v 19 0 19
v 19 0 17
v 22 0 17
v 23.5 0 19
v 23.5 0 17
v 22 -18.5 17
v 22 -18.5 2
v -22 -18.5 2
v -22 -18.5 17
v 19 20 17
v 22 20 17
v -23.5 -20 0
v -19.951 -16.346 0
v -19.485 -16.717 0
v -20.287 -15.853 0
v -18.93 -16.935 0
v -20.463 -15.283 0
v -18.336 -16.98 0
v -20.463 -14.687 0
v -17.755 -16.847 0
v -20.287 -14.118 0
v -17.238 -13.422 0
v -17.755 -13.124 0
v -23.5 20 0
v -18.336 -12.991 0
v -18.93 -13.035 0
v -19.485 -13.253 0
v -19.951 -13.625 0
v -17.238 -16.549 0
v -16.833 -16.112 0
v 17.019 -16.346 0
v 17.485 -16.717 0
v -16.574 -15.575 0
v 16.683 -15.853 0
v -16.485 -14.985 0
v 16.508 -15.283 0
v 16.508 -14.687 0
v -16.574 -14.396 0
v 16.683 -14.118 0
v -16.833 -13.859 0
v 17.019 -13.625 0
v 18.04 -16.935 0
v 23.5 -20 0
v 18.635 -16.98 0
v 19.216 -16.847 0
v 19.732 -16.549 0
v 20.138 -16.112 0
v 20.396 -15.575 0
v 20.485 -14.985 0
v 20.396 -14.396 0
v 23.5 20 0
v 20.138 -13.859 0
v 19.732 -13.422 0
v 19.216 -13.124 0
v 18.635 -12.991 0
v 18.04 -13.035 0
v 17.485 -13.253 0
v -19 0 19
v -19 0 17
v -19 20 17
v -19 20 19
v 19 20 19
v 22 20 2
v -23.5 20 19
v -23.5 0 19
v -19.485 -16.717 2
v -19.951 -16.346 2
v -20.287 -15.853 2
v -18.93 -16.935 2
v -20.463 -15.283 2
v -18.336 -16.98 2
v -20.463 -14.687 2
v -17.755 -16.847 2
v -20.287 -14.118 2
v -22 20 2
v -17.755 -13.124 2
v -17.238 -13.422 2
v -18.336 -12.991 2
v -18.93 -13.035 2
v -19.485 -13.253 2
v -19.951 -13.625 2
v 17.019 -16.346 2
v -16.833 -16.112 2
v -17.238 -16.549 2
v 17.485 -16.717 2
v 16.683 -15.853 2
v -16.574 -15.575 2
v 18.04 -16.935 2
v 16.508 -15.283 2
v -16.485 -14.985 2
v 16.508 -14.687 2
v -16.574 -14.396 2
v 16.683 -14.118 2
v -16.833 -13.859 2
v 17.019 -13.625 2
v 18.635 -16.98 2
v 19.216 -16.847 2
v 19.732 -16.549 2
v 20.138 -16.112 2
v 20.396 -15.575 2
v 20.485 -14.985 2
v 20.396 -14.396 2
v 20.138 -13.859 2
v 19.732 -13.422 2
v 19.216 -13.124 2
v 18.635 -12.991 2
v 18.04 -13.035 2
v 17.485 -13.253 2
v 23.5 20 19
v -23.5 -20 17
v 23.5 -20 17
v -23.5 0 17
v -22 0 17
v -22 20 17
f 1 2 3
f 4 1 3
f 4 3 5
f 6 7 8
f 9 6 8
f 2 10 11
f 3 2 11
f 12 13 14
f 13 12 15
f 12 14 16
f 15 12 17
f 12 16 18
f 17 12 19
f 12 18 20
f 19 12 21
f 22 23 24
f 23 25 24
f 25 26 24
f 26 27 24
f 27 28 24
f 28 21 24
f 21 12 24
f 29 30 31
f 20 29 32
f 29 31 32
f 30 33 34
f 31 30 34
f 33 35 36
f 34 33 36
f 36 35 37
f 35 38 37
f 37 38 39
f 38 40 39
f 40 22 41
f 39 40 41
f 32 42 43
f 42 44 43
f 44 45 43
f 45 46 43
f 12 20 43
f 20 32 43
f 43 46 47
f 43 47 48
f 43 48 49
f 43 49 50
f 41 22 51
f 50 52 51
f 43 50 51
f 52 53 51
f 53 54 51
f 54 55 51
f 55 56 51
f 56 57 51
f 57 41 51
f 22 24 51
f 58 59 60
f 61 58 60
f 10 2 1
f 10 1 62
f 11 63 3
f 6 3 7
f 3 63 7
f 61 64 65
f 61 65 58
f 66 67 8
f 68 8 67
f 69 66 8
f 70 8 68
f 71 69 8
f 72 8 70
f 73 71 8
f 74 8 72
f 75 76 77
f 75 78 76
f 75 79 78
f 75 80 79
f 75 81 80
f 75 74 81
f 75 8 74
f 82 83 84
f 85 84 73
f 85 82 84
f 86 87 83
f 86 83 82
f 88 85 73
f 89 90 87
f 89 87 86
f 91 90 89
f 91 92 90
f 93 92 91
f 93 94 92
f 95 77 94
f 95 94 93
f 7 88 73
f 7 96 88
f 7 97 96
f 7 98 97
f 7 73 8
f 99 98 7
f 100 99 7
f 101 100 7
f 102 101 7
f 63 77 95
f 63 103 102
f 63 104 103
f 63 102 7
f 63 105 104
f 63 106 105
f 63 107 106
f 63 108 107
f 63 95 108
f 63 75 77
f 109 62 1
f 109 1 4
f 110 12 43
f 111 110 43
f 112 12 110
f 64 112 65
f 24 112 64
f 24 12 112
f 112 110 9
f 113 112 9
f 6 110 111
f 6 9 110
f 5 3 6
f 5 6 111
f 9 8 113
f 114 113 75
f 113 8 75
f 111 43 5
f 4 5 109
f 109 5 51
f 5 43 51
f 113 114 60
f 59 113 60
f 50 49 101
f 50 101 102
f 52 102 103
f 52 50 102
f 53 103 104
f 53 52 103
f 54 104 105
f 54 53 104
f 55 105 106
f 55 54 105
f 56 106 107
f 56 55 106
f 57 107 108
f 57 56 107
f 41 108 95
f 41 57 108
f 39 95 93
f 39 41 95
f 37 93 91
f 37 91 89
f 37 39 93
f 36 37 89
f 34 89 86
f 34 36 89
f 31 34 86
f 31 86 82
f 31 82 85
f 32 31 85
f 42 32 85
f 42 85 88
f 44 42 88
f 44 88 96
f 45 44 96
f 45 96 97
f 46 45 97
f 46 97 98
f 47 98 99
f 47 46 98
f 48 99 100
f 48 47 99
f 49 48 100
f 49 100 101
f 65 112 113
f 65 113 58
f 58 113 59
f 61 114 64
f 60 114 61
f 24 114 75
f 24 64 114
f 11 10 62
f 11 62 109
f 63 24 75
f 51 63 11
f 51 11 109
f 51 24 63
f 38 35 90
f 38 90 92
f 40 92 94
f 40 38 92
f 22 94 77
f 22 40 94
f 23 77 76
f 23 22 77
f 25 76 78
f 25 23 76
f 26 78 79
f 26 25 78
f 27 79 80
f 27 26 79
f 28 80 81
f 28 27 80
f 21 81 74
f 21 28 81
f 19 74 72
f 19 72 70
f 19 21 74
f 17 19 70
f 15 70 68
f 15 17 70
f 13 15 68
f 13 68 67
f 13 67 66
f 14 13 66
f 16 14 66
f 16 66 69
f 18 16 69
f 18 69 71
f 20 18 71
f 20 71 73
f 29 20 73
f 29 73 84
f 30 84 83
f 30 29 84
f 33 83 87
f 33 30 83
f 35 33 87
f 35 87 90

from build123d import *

# Parameters (mm, degrees)
SKETCH_W     = 47
SKETCH_H     = 40
SKETCH_R     = 2
PAD_DEPTH    = 2
PAD001_DEPTH = 15
SKETCH002_W  = 4.5
SKETCH002_H  = 20
PAD002_DEPTH = 2


with BuildPart() as part:
    # Sketch → Pad (new body)
    with BuildSketch(Plane.XY):
        Rectangle(SKETCH_W, SKETCH_H)
        with Locations((-18.485281, -14.985281)):
            Circle(SKETCH_R, mode=Mode.SUBTRACT)
        with Locations((18.485281, -14.985281)):
            Circle(SKETCH_R, mode=Mode.SUBTRACT)
    extrude(amount=PAD_DEPTH)

    # Sketch001 (on Face8 of Pad) → Pad001 (join)
    with BuildSketch(Plane.XY.offset(2)):
        Polygon((-23.5, -20), (23.5, -20), (23.5, 20), (22, 20), (22, -18.5), (-22, -18.5), (-22, 20), (-23.5, 20), align=None)
    extrude(amount=PAD001_DEPTH)

    # Sketch002 (on Face14 of Pad001) → Pad002 (join)
    with BuildSketch(Plane.XY.offset(17)):
        with Locations((-21.25, 10)):
            Rectangle(SKETCH002_W, SKETCH002_H)
        with Locations((21.25, 10)):
            Rectangle(SKETCH002_W, SKETCH002_H)
    extrude(amount=PAD002_DEPTH)


solid = part.part
